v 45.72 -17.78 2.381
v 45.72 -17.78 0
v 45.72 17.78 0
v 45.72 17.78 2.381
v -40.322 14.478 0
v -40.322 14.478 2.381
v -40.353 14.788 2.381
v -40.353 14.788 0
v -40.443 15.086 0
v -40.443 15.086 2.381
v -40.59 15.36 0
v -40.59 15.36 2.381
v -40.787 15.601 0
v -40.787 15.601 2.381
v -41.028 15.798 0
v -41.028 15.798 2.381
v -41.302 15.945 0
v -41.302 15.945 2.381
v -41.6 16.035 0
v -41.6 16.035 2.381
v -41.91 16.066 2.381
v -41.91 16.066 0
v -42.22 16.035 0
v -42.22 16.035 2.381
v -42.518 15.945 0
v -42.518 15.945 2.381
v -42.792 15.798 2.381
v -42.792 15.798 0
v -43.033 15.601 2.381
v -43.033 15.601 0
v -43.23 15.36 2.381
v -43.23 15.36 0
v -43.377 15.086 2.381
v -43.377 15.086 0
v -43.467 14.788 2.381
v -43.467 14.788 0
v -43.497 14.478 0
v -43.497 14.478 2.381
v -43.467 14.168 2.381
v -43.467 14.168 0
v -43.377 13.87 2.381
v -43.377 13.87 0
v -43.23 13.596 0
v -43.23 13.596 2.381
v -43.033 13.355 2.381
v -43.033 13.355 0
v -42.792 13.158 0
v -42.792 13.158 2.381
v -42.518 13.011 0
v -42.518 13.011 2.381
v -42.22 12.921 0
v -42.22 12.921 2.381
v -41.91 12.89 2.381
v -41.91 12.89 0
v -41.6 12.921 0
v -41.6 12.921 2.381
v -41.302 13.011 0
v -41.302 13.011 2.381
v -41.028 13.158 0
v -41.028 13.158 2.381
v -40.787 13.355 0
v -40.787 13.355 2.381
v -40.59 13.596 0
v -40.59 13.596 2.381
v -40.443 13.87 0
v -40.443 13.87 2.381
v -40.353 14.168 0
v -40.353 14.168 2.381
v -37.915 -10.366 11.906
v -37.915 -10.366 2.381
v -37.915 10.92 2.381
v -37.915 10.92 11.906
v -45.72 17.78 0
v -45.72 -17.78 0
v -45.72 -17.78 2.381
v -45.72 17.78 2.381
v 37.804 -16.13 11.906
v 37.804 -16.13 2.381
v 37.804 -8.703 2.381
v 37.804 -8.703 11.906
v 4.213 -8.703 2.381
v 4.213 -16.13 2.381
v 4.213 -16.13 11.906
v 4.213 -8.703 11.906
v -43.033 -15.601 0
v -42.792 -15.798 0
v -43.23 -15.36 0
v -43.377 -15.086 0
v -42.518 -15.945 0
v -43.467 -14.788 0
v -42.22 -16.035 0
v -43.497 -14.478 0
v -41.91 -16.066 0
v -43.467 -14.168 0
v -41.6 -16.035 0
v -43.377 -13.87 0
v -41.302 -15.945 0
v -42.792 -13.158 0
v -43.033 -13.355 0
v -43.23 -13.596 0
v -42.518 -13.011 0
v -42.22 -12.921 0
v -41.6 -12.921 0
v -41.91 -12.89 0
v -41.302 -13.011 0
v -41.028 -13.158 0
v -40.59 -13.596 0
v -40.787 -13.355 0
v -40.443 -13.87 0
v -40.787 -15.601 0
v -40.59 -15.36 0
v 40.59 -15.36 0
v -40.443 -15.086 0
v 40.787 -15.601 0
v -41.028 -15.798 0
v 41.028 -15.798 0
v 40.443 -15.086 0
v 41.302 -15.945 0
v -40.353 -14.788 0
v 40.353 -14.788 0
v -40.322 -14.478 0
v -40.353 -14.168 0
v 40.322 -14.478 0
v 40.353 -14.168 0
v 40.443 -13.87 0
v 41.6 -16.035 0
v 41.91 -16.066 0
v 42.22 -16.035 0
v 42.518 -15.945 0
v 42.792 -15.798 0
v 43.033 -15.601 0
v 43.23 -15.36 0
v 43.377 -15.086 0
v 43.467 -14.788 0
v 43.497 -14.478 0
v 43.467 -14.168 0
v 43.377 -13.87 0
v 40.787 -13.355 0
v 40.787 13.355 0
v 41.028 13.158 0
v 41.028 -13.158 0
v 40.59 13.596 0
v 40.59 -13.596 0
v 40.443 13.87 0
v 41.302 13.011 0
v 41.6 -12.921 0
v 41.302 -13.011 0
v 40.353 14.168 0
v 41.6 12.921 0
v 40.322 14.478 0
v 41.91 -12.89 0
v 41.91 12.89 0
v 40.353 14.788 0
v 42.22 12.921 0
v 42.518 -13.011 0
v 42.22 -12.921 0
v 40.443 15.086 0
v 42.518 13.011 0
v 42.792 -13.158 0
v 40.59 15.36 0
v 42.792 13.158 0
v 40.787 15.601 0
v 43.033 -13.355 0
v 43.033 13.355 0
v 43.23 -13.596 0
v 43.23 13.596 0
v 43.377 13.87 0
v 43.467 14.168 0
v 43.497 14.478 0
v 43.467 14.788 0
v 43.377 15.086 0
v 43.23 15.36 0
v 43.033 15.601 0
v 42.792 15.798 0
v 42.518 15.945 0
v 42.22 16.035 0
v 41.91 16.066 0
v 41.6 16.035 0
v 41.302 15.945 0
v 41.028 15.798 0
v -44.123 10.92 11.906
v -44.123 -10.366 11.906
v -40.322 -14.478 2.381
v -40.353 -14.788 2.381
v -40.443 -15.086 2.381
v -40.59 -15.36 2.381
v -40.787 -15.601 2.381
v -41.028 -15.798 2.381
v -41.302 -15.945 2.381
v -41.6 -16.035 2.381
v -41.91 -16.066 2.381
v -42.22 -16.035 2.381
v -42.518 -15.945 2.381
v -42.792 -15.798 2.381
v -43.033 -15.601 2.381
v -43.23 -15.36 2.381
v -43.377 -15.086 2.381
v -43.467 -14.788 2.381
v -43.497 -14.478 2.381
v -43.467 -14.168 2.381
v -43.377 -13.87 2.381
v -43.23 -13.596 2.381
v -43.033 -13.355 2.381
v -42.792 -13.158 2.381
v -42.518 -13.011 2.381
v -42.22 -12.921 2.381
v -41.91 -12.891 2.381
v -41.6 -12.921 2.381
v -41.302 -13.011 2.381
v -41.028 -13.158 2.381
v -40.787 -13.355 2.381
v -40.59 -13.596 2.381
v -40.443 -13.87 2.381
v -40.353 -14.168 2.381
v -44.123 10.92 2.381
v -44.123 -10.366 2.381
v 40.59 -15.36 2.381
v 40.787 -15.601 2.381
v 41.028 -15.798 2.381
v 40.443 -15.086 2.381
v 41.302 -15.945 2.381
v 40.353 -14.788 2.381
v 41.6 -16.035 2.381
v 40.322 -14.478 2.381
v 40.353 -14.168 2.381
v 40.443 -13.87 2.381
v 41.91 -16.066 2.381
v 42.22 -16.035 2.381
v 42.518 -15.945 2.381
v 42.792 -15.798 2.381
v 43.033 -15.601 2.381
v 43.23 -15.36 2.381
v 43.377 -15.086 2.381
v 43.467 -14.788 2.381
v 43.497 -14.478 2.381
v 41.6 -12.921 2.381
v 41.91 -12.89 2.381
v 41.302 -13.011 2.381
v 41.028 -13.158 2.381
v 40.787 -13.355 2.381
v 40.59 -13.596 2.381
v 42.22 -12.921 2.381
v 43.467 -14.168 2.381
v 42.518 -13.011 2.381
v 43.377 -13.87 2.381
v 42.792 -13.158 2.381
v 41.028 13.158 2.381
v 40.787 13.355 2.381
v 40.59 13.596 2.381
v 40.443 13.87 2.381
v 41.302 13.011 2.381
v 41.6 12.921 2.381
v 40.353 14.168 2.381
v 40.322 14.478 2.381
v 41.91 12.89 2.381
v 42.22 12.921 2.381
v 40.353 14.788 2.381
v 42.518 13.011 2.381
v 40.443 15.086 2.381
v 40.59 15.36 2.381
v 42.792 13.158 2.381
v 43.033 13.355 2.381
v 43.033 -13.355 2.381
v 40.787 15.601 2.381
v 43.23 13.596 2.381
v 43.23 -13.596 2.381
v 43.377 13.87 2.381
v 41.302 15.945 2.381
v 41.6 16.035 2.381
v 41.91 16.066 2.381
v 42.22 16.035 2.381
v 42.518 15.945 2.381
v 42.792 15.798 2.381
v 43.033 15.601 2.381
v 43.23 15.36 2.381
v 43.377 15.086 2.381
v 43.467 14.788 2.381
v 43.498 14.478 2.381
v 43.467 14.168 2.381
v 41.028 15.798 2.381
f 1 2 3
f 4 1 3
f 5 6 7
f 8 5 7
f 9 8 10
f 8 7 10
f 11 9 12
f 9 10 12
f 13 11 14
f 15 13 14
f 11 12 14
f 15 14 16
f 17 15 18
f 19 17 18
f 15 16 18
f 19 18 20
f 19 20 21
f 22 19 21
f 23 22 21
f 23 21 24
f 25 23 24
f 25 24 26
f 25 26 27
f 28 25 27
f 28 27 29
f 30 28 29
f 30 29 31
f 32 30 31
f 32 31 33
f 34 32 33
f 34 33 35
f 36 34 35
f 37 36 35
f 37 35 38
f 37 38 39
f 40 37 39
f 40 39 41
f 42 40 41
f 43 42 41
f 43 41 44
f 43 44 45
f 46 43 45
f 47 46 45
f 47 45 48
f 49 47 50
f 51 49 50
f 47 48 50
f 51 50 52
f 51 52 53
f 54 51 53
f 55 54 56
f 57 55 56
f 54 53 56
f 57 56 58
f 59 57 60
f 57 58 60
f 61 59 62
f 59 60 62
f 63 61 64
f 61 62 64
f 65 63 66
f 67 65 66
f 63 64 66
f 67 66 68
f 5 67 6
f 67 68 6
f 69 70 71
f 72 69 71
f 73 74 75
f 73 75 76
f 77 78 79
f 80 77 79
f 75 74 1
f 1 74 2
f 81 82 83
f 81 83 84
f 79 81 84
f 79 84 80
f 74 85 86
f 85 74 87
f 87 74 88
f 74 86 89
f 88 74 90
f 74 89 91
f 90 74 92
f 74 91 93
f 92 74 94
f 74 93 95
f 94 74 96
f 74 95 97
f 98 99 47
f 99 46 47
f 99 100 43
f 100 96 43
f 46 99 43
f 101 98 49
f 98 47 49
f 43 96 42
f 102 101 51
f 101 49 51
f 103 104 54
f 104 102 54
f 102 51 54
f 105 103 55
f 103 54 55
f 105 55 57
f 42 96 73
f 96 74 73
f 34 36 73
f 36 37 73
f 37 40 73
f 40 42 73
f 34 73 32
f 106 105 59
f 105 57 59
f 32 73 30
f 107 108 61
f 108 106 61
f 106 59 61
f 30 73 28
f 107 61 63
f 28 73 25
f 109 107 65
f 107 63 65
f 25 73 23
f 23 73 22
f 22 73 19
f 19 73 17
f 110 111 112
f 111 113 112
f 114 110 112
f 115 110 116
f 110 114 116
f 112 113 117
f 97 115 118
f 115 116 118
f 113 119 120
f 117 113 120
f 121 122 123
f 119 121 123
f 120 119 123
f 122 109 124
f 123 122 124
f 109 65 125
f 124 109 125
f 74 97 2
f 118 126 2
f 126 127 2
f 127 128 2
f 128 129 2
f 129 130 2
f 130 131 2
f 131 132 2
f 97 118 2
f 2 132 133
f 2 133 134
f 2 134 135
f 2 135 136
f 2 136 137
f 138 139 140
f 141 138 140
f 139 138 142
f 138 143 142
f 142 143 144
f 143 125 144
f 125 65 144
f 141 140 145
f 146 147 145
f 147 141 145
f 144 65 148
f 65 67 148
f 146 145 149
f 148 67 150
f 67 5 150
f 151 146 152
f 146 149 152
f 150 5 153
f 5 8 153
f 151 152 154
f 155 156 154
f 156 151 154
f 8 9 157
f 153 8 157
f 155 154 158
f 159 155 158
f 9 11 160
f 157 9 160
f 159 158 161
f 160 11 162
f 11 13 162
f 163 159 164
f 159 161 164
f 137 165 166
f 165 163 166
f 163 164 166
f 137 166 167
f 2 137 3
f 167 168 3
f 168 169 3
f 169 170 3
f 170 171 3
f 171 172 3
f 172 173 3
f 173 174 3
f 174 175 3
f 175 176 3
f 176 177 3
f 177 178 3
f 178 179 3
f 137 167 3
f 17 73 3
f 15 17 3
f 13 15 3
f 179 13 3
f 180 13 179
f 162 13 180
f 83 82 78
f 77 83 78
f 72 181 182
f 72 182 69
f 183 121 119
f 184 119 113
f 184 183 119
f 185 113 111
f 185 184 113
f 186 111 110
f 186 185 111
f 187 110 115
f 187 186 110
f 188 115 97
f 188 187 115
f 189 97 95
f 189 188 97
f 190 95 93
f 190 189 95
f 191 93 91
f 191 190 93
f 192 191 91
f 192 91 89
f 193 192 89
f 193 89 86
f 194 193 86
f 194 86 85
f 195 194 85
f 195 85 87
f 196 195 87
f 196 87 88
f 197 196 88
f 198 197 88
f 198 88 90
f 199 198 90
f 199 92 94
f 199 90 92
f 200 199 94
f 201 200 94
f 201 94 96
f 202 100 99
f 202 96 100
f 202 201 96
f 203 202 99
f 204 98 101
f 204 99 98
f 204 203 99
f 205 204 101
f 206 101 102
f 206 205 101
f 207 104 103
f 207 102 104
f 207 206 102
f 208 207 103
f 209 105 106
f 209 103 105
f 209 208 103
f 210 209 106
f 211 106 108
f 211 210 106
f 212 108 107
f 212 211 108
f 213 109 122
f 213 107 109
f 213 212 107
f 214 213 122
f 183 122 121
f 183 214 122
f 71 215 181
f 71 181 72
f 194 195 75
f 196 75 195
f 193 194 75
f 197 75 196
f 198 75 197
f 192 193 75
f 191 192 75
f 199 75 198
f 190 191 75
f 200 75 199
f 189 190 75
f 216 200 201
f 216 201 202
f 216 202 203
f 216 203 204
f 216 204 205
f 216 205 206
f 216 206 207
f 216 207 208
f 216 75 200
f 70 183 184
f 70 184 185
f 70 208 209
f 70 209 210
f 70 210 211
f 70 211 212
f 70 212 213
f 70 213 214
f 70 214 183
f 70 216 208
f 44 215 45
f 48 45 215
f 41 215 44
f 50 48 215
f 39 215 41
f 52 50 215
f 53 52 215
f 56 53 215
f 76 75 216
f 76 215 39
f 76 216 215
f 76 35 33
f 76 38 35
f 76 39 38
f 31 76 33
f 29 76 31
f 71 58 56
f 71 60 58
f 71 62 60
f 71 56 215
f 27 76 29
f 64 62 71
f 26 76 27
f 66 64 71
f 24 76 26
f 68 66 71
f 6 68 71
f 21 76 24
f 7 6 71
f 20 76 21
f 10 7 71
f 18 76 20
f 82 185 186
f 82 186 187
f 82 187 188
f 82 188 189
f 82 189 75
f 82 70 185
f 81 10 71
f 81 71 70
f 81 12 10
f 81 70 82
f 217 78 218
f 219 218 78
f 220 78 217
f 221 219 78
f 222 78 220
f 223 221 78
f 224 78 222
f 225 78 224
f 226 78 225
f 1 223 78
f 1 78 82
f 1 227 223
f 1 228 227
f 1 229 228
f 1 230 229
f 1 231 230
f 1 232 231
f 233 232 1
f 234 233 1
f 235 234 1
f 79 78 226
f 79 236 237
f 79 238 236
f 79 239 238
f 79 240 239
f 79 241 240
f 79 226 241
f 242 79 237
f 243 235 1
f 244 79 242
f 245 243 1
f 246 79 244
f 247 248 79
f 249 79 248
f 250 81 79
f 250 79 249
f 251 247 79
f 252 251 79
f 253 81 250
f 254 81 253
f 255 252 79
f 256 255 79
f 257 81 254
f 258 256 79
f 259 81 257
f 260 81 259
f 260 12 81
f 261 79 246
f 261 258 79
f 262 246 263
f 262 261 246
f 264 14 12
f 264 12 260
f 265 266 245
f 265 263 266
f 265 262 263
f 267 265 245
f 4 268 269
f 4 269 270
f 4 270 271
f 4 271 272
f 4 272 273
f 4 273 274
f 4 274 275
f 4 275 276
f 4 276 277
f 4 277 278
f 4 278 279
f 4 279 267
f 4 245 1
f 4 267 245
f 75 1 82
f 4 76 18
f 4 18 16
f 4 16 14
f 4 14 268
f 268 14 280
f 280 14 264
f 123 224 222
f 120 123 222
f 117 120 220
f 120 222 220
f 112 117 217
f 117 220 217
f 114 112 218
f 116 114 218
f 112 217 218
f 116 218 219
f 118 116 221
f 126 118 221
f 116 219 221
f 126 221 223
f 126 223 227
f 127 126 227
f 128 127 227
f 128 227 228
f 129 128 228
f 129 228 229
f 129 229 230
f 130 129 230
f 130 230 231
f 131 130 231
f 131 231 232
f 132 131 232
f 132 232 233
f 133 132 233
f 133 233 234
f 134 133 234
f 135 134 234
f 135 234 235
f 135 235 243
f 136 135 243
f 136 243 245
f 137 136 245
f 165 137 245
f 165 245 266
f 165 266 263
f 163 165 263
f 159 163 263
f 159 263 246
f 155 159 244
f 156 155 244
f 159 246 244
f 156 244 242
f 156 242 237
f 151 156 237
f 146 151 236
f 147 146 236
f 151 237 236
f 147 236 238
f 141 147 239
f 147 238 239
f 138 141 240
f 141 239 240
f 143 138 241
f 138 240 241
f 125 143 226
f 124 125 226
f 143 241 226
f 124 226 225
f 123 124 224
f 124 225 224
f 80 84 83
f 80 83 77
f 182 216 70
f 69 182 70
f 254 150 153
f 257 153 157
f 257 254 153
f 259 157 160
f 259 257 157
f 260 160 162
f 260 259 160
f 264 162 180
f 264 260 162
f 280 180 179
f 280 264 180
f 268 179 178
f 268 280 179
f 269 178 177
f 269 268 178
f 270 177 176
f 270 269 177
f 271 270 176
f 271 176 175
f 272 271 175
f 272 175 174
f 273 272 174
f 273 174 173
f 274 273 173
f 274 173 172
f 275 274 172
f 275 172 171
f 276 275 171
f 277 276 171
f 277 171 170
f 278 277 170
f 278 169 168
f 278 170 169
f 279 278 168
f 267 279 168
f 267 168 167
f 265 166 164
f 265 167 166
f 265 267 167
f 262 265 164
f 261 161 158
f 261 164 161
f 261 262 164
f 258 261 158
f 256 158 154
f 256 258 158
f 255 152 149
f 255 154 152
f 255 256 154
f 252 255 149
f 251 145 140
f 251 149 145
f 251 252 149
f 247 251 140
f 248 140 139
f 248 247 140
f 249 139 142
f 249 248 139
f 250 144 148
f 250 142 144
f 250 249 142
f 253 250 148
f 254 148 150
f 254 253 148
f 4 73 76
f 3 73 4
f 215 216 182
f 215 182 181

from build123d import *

# Parameters (mm, degrees)
SKETCH1_W               = 91.44
SKETCH1_H               = 35.56
BOSS_EXTRUDE1_DEPTH     = 2.38125
SKETCH2_R               = 1.5875
CUT_EXTRUDE1_DEPTH      = 50.113309312
MIRROR2_COPY_1_SKETCH_R = 1.5875
MIRROR2_COPY_1_DEPTH    = 50.113309312
SKETCH3_W               = 6.208251033
SKETCH3_H               = 21.285432112
SKETCH3_W_2             = 33.591072552
SKETCH3_H_2             = 7.427728914
BOSS_EXTRUDE2_DEPTH     = 9.525


with BuildPart() as part:
    # Sketch1 → Boss-Extrude1 (new body)
    with BuildSketch(Plane.XY):
        Rectangle(SKETCH1_W, SKETCH1_H)
    extrude(amount=BOSS_EXTRUDE1_DEPTH)

    # Sketch2 → Cut-Extrude1 (cut, through all)
    with BuildSketch(Plane.XY.offset(2.38125)):
        with Locations((-41.91, 14.478)):
            Circle(SKETCH2_R)
    cut_extrude1 = extrude(amount=-CUT_EXTRUDE1_DEPTH, mode=Mode.SUBTRACT)

    # Mirror1: Cut-Extrude1 across plane
    add(cut_extrude1.mirror(Plane(origin=(0, 0, 0), x_dir=(0, 0, 1), z_dir=(1, 0, 0))), mode=Mode.SUBTRACT)

    # Mirror2: Cut-Extrude1 across plane
    add(cut_extrude1.mirror(Plane.ZX), mode=Mode.SUBTRACT)

    # Mirror2 copy 1 sketch → Mirror2 copy 1 (cut, through all)
    with BuildSketch(Plane(origin=(0, 0, 2.38125), x_dir=(-1, 0, 0), z_dir=(0, 0, 1))):
        with Locations((-41.91, 14.478)):
            Circle(MIRROR2_COPY_1_SKETCH_R)
    extrude(amount=-MIRROR2_COPY_1_DEPTH, mode=Mode.SUBTRACT)

    # Sketch3 → Boss-Extrude2 (add)
    with BuildSketch(Plane.XY.offset(2.38125)):
        with Locations((-41.018801466, 0.277154064)):
            Rectangle(SKETCH3_W, SKETCH3_H)
        with Locations((21.008278048, -12.416502065)):
            Rectangle(SKETCH3_W_2, SKETCH3_H_2)
    extrude(amount=BOSS_EXTRUDE2_DEPTH)


solid = part.part
